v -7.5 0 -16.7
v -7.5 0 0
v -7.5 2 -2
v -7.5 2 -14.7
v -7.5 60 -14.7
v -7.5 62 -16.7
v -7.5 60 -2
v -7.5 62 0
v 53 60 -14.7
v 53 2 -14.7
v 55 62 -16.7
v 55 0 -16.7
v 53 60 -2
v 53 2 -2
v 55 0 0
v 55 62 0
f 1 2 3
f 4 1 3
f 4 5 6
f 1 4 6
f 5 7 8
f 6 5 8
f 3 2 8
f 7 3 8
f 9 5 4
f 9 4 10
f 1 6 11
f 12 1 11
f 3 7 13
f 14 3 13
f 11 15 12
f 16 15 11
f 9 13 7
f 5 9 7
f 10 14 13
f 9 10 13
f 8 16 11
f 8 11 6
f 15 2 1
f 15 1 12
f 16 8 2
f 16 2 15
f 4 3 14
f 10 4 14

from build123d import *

# Parameters (mm, degrees)
F0_W     = 55
F0_H     = 62
F0_W_2   = 7.5
F1_DEPTH = 16.7
F2_T     = -2


with BuildPart() as f1:
    # F0 (on Top) → F1 (new body)
    with BuildSketch(Plane.XY):
        with Locations((27.5, 31)):
            Rectangle(F0_W, F0_H)
        with Locations((-3.75, 31)):
            Rectangle(F0_W_2, F0_H)
    extrude(amount=-F1_DEPTH)

    # F2
    f2_openings = [f1.faces().sort_by_distance(p)[0] for p in [
        (-7.5, 31, -8.35),
    ]]
    offset(amount=F2_T, openings=f2_openings)


solid = f1.part
